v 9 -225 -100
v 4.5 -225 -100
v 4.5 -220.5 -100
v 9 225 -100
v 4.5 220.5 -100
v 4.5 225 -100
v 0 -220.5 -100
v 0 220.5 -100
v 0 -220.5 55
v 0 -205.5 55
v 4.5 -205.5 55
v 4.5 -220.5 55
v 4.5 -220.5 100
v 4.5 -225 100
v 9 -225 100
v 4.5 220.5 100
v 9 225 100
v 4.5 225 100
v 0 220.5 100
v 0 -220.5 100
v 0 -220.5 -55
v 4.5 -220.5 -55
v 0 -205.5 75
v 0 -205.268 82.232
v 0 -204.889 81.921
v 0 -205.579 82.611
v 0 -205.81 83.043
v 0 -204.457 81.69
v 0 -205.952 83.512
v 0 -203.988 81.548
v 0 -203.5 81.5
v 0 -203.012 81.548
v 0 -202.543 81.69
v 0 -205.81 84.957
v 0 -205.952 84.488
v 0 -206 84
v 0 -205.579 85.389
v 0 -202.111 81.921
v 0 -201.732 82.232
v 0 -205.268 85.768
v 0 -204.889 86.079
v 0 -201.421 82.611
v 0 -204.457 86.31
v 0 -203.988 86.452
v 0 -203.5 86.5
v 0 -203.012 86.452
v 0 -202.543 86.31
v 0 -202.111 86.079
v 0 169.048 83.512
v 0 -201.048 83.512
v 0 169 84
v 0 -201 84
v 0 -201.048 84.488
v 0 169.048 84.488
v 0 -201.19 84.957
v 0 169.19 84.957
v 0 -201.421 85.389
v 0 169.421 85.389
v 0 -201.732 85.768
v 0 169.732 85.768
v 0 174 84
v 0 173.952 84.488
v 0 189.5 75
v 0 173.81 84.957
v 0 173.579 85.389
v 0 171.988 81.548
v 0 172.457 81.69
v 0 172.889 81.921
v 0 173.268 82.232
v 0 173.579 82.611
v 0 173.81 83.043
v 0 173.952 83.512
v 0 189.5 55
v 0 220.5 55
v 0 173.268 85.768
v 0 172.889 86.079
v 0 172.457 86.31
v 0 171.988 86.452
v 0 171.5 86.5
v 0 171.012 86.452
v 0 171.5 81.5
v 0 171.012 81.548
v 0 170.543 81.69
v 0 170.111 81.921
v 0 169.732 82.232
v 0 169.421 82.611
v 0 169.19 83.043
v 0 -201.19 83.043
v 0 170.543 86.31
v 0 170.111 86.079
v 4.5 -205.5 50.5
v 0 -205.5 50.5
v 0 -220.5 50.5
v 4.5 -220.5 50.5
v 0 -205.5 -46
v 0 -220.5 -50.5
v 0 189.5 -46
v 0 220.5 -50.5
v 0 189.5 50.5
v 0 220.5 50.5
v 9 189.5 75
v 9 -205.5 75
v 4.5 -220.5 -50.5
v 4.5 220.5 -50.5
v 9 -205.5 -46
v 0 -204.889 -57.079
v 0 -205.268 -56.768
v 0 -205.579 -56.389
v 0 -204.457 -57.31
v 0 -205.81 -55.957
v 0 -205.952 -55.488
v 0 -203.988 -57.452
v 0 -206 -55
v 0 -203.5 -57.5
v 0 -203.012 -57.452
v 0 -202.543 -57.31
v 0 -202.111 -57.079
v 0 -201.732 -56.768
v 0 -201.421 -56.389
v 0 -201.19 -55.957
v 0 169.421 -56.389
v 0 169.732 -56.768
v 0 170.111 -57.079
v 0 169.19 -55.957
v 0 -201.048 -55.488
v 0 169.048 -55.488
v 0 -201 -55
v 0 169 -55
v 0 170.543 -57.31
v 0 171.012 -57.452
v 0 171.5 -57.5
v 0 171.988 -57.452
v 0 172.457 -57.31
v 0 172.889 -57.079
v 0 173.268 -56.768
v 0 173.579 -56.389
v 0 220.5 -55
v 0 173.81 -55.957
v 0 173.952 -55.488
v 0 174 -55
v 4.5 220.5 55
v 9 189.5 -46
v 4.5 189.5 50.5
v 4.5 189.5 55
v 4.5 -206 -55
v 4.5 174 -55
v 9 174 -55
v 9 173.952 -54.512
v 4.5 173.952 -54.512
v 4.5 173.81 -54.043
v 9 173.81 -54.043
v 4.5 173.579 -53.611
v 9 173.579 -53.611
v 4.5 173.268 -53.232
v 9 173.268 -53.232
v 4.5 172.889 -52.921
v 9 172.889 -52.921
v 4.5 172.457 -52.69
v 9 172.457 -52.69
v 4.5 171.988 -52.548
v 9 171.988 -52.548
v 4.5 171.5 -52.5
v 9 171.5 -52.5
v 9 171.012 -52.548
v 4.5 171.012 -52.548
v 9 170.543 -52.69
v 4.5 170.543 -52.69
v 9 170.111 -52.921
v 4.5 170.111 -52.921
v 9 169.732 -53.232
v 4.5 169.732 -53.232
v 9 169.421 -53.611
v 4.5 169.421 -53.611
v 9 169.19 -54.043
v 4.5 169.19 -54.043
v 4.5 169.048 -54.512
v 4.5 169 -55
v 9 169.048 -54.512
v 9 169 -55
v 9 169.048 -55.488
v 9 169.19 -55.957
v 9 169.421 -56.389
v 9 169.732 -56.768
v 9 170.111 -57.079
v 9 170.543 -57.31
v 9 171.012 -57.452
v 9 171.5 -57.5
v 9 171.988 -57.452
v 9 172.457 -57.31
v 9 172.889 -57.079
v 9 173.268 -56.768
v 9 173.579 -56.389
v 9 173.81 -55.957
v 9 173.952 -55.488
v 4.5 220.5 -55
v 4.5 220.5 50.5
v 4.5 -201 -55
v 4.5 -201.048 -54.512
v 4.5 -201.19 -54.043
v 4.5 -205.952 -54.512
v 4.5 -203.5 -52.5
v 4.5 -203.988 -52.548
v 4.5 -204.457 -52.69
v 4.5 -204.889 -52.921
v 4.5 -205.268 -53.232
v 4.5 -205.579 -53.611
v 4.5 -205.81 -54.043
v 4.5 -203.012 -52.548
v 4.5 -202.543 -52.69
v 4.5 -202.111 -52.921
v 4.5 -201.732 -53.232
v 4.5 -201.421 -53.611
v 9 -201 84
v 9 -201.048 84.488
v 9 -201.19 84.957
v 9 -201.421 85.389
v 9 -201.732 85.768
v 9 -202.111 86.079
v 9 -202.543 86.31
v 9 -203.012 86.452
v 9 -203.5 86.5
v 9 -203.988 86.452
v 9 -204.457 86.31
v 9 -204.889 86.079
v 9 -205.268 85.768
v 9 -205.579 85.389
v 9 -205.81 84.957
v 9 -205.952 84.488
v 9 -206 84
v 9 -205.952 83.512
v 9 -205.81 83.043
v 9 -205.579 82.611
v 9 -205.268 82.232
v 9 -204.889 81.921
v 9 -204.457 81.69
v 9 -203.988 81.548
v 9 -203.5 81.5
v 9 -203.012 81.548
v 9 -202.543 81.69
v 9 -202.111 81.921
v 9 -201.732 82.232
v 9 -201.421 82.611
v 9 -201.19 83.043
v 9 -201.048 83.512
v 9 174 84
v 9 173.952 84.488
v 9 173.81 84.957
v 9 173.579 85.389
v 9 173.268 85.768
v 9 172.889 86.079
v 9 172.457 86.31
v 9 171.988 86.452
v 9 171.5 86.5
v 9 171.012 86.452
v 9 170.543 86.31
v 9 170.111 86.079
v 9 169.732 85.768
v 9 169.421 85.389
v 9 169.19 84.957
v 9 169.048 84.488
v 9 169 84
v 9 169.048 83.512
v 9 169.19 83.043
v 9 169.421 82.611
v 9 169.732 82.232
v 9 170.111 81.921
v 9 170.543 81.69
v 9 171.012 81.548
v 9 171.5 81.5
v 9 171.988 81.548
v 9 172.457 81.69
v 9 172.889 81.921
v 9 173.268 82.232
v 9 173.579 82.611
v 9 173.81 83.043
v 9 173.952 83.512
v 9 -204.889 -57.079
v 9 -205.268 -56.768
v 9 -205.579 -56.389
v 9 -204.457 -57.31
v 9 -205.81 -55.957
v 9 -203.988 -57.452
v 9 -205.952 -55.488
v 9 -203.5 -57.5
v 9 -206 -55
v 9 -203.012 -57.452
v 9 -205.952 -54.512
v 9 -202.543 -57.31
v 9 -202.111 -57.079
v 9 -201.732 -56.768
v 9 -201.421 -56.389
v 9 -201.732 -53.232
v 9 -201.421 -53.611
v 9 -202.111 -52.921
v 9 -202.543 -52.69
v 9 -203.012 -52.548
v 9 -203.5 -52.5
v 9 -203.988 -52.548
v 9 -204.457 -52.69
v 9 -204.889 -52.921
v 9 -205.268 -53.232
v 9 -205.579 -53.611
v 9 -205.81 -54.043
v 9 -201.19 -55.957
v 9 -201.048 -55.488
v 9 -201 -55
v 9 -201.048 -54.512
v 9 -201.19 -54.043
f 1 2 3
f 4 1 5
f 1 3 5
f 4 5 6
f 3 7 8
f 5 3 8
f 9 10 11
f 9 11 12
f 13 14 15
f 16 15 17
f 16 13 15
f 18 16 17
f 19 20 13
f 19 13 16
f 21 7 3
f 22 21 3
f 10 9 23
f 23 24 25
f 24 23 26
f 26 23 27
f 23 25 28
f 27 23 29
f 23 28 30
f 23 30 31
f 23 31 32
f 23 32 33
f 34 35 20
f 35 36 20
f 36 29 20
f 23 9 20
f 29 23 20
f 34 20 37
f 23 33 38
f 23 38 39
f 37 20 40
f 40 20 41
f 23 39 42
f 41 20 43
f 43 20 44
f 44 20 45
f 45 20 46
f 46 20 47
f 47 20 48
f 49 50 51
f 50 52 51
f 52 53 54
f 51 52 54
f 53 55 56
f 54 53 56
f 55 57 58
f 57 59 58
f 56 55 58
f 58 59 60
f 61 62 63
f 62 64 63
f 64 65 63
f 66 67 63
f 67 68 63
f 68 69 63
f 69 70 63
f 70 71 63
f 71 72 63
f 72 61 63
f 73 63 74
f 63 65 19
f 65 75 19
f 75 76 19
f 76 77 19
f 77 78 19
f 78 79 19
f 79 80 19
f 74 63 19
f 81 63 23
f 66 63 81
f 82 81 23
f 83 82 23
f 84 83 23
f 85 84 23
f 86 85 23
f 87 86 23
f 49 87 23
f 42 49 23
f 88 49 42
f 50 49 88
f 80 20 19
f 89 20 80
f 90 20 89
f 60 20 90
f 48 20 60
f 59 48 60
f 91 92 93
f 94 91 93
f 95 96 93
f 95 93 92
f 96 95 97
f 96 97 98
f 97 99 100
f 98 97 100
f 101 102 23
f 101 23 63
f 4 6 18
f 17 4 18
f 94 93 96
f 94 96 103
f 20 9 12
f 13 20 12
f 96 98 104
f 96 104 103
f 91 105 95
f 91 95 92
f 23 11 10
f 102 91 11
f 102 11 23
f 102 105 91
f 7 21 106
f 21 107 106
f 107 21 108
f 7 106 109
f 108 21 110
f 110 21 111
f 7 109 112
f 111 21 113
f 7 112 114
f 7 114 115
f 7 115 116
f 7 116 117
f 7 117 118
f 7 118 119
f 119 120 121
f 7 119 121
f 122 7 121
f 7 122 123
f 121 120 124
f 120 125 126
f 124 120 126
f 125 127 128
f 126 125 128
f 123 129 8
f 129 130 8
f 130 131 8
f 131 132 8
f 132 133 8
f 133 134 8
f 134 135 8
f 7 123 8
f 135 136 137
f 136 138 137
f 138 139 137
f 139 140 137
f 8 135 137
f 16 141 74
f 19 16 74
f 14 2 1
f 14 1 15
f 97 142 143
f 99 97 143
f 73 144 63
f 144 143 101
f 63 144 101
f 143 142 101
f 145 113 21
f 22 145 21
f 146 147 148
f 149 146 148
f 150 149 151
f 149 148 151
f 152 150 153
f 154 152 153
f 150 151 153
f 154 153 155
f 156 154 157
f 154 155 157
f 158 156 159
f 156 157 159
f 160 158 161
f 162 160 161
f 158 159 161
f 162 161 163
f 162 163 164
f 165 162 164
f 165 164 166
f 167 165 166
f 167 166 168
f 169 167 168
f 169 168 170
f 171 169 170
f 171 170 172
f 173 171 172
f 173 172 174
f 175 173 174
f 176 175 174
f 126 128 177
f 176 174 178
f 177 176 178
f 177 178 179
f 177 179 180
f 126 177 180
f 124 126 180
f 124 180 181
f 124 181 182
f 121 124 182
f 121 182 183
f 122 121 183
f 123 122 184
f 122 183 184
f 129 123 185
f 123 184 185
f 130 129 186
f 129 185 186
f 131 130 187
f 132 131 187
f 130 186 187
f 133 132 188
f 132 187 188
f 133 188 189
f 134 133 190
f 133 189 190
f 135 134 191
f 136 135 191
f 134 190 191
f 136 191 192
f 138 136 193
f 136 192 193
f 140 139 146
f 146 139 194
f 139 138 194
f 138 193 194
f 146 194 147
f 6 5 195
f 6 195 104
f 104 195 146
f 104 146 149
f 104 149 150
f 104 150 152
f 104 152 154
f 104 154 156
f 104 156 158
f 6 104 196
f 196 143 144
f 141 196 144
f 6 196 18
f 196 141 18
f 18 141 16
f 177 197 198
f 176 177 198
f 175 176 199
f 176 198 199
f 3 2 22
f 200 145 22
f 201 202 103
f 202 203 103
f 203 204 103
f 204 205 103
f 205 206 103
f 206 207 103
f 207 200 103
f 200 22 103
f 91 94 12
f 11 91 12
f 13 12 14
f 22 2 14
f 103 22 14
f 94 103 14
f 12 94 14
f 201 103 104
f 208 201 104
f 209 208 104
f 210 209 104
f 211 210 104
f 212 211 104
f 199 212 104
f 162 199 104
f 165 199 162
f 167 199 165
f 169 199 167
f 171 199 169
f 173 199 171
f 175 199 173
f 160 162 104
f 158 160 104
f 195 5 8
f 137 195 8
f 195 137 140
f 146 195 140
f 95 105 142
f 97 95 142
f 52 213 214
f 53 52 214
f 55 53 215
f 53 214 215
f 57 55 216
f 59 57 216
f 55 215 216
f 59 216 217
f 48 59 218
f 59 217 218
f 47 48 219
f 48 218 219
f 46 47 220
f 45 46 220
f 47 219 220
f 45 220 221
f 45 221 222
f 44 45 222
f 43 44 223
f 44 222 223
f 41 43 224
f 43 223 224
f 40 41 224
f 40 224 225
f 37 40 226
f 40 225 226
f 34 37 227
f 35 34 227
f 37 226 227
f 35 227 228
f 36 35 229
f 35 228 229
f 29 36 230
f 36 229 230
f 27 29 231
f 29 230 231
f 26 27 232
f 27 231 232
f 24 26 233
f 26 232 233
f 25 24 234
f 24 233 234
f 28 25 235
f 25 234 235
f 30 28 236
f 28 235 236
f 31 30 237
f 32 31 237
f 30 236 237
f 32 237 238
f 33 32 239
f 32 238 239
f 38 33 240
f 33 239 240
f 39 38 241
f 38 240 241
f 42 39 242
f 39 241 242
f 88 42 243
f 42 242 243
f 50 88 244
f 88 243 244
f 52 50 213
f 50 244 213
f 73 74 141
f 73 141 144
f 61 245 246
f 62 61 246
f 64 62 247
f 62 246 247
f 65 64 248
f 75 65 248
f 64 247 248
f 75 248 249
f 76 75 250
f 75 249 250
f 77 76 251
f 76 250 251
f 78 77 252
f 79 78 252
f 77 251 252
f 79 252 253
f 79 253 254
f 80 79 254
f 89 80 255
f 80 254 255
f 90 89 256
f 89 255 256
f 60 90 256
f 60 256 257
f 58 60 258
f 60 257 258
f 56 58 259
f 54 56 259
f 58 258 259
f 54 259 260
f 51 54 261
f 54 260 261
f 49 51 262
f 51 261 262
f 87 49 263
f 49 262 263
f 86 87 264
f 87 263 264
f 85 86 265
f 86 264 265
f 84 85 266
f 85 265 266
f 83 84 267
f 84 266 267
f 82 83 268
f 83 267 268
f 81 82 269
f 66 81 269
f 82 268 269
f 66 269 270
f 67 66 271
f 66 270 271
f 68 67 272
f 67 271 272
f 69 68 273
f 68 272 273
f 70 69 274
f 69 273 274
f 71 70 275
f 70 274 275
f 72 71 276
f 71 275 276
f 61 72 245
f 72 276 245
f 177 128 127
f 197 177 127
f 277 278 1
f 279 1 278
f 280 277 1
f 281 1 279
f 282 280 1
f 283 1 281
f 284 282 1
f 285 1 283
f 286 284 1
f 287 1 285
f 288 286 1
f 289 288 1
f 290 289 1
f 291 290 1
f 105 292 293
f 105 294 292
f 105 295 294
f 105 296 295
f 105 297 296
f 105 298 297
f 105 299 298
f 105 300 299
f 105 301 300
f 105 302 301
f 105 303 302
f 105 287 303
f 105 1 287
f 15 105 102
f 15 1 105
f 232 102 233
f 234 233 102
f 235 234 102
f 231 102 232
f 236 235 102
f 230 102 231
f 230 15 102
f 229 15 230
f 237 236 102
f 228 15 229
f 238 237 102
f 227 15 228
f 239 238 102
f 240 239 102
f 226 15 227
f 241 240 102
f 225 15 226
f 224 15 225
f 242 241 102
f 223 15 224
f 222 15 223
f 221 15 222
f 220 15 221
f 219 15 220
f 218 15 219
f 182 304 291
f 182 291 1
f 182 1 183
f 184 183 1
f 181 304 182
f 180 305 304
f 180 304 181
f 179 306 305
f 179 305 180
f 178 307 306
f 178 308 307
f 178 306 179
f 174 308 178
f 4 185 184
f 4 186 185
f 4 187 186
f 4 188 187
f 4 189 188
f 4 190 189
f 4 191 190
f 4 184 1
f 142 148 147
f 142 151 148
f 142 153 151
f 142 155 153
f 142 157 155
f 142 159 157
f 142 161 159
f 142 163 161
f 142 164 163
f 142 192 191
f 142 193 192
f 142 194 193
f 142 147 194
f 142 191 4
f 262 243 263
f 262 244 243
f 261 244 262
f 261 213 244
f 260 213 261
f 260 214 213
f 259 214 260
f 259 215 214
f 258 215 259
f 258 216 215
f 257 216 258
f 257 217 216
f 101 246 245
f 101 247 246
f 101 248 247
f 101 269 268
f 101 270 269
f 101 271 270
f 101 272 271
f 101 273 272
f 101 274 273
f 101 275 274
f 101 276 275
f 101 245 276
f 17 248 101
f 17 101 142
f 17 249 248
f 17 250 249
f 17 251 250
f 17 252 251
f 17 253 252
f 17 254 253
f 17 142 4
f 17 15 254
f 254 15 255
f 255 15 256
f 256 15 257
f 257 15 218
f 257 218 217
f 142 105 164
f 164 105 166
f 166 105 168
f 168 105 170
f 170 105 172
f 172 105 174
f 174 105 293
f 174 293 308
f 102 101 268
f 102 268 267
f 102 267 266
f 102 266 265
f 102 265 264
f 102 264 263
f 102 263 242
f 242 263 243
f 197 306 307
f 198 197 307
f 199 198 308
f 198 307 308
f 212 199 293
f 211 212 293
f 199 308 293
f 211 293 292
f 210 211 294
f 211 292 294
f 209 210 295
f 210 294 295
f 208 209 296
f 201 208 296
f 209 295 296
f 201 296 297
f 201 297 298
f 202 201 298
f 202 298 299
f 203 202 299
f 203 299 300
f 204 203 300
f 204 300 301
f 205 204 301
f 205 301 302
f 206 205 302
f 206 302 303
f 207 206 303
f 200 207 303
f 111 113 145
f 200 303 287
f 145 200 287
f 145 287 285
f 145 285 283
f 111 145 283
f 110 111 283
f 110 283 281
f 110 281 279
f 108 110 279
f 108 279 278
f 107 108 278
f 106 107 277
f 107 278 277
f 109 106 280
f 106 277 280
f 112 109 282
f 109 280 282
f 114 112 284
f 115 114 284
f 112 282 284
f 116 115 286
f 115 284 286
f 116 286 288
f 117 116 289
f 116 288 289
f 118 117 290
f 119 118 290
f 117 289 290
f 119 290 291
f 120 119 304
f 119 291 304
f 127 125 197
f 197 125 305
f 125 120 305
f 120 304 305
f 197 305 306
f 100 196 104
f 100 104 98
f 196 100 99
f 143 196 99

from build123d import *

# Parameters (mm, degrees)
F0_W      = 450
F0_H      = 200
F1_DEPTH  = 9
F2_W      = 4.5
F2_H      = 200
F3_DEPTH  = 4.5
F4_W      = 4.5
F4_H      = 200
F5_DEPTH  = 4.5
F6_W      = 441
F6_H      = 4.5
F7_DEPTH  = 4.5
F8_W      = 441
F8_H      = 4.5
F9_DEPTH  = 4.5
F10_W     = 395
F10_H     = 121
F11_DEPTH = 9
F12_R     = 2.5
F13_DEPTH = 9


with BuildPart() as f1:
    # F0 (on Right) → F1 (new body)
    with BuildSketch(Plane.YZ):
        Rectangle(F0_W, F0_H)
    extrude(amount=F1_DEPTH)

    # F2 (on face) → F3 (cut)
    with BuildSketch(Plane.XZ.offset(225)):
        with Locations((2.25, 0)):
            Rectangle(F2_W, F2_H)
    extrude(amount=-F3_DEPTH, mode=Mode.SUBTRACT)

    # F4 (on face) → F5 (cut)
    with BuildSketch(Plane(origin=(0, 225, 0), x_dir=(-1, 0, 0), z_dir=(0, 1, 0))):
        with Locations((-2.25, 0)):
            Rectangle(F4_W, F4_H)
    extrude(amount=-F5_DEPTH, mode=Mode.SUBTRACT)

    # F6 (on face) → F7 (cut)
    with BuildSketch(Plane(origin=(0, 0, 0), x_dir=(0, -1, 0), z_dir=(-1, 0, 0))):
        with Locations((0, 52.75)):
            Rectangle(F6_W, F6_H)
    extrude(amount=-F7_DEPTH, mode=Mode.SUBTRACT)

    # F8 (on face) → F9 (cut)
    with BuildSketch(Plane(origin=(0, 0, 0), x_dir=(0, -1, 0), z_dir=(-1, 0, 0))):
        with Locations((0, -52.75)):
            Rectangle(F8_W, F8_H)
    extrude(amount=-F9_DEPTH, mode=Mode.SUBTRACT)

    # F10 (on face) → F11 (cut, through all)
    with BuildSketch(Plane.YZ.offset(9)):
        with Locations((-8, 14.5)):
            Rectangle(F10_W, F10_H)
    extrude(amount=-F11_DEPTH, mode=Mode.SUBTRACT)

    # F12 (on face) → F13 (cut, through all)
    with BuildSketch(Plane.YZ.offset(9)):
        with Locations((-203.5, 84)):
            Circle(F12_R)
        with Locations((171.5, 84)):
            Circle(F12_R)
        with Locations((171.5, -55)):
            Circle(F12_R)
        with Locations((-203.5, -55)):
            Circle(F12_R)
    extrude(amount=-F13_DEPTH, mode=Mode.SUBTRACT)


solid = f1.part
